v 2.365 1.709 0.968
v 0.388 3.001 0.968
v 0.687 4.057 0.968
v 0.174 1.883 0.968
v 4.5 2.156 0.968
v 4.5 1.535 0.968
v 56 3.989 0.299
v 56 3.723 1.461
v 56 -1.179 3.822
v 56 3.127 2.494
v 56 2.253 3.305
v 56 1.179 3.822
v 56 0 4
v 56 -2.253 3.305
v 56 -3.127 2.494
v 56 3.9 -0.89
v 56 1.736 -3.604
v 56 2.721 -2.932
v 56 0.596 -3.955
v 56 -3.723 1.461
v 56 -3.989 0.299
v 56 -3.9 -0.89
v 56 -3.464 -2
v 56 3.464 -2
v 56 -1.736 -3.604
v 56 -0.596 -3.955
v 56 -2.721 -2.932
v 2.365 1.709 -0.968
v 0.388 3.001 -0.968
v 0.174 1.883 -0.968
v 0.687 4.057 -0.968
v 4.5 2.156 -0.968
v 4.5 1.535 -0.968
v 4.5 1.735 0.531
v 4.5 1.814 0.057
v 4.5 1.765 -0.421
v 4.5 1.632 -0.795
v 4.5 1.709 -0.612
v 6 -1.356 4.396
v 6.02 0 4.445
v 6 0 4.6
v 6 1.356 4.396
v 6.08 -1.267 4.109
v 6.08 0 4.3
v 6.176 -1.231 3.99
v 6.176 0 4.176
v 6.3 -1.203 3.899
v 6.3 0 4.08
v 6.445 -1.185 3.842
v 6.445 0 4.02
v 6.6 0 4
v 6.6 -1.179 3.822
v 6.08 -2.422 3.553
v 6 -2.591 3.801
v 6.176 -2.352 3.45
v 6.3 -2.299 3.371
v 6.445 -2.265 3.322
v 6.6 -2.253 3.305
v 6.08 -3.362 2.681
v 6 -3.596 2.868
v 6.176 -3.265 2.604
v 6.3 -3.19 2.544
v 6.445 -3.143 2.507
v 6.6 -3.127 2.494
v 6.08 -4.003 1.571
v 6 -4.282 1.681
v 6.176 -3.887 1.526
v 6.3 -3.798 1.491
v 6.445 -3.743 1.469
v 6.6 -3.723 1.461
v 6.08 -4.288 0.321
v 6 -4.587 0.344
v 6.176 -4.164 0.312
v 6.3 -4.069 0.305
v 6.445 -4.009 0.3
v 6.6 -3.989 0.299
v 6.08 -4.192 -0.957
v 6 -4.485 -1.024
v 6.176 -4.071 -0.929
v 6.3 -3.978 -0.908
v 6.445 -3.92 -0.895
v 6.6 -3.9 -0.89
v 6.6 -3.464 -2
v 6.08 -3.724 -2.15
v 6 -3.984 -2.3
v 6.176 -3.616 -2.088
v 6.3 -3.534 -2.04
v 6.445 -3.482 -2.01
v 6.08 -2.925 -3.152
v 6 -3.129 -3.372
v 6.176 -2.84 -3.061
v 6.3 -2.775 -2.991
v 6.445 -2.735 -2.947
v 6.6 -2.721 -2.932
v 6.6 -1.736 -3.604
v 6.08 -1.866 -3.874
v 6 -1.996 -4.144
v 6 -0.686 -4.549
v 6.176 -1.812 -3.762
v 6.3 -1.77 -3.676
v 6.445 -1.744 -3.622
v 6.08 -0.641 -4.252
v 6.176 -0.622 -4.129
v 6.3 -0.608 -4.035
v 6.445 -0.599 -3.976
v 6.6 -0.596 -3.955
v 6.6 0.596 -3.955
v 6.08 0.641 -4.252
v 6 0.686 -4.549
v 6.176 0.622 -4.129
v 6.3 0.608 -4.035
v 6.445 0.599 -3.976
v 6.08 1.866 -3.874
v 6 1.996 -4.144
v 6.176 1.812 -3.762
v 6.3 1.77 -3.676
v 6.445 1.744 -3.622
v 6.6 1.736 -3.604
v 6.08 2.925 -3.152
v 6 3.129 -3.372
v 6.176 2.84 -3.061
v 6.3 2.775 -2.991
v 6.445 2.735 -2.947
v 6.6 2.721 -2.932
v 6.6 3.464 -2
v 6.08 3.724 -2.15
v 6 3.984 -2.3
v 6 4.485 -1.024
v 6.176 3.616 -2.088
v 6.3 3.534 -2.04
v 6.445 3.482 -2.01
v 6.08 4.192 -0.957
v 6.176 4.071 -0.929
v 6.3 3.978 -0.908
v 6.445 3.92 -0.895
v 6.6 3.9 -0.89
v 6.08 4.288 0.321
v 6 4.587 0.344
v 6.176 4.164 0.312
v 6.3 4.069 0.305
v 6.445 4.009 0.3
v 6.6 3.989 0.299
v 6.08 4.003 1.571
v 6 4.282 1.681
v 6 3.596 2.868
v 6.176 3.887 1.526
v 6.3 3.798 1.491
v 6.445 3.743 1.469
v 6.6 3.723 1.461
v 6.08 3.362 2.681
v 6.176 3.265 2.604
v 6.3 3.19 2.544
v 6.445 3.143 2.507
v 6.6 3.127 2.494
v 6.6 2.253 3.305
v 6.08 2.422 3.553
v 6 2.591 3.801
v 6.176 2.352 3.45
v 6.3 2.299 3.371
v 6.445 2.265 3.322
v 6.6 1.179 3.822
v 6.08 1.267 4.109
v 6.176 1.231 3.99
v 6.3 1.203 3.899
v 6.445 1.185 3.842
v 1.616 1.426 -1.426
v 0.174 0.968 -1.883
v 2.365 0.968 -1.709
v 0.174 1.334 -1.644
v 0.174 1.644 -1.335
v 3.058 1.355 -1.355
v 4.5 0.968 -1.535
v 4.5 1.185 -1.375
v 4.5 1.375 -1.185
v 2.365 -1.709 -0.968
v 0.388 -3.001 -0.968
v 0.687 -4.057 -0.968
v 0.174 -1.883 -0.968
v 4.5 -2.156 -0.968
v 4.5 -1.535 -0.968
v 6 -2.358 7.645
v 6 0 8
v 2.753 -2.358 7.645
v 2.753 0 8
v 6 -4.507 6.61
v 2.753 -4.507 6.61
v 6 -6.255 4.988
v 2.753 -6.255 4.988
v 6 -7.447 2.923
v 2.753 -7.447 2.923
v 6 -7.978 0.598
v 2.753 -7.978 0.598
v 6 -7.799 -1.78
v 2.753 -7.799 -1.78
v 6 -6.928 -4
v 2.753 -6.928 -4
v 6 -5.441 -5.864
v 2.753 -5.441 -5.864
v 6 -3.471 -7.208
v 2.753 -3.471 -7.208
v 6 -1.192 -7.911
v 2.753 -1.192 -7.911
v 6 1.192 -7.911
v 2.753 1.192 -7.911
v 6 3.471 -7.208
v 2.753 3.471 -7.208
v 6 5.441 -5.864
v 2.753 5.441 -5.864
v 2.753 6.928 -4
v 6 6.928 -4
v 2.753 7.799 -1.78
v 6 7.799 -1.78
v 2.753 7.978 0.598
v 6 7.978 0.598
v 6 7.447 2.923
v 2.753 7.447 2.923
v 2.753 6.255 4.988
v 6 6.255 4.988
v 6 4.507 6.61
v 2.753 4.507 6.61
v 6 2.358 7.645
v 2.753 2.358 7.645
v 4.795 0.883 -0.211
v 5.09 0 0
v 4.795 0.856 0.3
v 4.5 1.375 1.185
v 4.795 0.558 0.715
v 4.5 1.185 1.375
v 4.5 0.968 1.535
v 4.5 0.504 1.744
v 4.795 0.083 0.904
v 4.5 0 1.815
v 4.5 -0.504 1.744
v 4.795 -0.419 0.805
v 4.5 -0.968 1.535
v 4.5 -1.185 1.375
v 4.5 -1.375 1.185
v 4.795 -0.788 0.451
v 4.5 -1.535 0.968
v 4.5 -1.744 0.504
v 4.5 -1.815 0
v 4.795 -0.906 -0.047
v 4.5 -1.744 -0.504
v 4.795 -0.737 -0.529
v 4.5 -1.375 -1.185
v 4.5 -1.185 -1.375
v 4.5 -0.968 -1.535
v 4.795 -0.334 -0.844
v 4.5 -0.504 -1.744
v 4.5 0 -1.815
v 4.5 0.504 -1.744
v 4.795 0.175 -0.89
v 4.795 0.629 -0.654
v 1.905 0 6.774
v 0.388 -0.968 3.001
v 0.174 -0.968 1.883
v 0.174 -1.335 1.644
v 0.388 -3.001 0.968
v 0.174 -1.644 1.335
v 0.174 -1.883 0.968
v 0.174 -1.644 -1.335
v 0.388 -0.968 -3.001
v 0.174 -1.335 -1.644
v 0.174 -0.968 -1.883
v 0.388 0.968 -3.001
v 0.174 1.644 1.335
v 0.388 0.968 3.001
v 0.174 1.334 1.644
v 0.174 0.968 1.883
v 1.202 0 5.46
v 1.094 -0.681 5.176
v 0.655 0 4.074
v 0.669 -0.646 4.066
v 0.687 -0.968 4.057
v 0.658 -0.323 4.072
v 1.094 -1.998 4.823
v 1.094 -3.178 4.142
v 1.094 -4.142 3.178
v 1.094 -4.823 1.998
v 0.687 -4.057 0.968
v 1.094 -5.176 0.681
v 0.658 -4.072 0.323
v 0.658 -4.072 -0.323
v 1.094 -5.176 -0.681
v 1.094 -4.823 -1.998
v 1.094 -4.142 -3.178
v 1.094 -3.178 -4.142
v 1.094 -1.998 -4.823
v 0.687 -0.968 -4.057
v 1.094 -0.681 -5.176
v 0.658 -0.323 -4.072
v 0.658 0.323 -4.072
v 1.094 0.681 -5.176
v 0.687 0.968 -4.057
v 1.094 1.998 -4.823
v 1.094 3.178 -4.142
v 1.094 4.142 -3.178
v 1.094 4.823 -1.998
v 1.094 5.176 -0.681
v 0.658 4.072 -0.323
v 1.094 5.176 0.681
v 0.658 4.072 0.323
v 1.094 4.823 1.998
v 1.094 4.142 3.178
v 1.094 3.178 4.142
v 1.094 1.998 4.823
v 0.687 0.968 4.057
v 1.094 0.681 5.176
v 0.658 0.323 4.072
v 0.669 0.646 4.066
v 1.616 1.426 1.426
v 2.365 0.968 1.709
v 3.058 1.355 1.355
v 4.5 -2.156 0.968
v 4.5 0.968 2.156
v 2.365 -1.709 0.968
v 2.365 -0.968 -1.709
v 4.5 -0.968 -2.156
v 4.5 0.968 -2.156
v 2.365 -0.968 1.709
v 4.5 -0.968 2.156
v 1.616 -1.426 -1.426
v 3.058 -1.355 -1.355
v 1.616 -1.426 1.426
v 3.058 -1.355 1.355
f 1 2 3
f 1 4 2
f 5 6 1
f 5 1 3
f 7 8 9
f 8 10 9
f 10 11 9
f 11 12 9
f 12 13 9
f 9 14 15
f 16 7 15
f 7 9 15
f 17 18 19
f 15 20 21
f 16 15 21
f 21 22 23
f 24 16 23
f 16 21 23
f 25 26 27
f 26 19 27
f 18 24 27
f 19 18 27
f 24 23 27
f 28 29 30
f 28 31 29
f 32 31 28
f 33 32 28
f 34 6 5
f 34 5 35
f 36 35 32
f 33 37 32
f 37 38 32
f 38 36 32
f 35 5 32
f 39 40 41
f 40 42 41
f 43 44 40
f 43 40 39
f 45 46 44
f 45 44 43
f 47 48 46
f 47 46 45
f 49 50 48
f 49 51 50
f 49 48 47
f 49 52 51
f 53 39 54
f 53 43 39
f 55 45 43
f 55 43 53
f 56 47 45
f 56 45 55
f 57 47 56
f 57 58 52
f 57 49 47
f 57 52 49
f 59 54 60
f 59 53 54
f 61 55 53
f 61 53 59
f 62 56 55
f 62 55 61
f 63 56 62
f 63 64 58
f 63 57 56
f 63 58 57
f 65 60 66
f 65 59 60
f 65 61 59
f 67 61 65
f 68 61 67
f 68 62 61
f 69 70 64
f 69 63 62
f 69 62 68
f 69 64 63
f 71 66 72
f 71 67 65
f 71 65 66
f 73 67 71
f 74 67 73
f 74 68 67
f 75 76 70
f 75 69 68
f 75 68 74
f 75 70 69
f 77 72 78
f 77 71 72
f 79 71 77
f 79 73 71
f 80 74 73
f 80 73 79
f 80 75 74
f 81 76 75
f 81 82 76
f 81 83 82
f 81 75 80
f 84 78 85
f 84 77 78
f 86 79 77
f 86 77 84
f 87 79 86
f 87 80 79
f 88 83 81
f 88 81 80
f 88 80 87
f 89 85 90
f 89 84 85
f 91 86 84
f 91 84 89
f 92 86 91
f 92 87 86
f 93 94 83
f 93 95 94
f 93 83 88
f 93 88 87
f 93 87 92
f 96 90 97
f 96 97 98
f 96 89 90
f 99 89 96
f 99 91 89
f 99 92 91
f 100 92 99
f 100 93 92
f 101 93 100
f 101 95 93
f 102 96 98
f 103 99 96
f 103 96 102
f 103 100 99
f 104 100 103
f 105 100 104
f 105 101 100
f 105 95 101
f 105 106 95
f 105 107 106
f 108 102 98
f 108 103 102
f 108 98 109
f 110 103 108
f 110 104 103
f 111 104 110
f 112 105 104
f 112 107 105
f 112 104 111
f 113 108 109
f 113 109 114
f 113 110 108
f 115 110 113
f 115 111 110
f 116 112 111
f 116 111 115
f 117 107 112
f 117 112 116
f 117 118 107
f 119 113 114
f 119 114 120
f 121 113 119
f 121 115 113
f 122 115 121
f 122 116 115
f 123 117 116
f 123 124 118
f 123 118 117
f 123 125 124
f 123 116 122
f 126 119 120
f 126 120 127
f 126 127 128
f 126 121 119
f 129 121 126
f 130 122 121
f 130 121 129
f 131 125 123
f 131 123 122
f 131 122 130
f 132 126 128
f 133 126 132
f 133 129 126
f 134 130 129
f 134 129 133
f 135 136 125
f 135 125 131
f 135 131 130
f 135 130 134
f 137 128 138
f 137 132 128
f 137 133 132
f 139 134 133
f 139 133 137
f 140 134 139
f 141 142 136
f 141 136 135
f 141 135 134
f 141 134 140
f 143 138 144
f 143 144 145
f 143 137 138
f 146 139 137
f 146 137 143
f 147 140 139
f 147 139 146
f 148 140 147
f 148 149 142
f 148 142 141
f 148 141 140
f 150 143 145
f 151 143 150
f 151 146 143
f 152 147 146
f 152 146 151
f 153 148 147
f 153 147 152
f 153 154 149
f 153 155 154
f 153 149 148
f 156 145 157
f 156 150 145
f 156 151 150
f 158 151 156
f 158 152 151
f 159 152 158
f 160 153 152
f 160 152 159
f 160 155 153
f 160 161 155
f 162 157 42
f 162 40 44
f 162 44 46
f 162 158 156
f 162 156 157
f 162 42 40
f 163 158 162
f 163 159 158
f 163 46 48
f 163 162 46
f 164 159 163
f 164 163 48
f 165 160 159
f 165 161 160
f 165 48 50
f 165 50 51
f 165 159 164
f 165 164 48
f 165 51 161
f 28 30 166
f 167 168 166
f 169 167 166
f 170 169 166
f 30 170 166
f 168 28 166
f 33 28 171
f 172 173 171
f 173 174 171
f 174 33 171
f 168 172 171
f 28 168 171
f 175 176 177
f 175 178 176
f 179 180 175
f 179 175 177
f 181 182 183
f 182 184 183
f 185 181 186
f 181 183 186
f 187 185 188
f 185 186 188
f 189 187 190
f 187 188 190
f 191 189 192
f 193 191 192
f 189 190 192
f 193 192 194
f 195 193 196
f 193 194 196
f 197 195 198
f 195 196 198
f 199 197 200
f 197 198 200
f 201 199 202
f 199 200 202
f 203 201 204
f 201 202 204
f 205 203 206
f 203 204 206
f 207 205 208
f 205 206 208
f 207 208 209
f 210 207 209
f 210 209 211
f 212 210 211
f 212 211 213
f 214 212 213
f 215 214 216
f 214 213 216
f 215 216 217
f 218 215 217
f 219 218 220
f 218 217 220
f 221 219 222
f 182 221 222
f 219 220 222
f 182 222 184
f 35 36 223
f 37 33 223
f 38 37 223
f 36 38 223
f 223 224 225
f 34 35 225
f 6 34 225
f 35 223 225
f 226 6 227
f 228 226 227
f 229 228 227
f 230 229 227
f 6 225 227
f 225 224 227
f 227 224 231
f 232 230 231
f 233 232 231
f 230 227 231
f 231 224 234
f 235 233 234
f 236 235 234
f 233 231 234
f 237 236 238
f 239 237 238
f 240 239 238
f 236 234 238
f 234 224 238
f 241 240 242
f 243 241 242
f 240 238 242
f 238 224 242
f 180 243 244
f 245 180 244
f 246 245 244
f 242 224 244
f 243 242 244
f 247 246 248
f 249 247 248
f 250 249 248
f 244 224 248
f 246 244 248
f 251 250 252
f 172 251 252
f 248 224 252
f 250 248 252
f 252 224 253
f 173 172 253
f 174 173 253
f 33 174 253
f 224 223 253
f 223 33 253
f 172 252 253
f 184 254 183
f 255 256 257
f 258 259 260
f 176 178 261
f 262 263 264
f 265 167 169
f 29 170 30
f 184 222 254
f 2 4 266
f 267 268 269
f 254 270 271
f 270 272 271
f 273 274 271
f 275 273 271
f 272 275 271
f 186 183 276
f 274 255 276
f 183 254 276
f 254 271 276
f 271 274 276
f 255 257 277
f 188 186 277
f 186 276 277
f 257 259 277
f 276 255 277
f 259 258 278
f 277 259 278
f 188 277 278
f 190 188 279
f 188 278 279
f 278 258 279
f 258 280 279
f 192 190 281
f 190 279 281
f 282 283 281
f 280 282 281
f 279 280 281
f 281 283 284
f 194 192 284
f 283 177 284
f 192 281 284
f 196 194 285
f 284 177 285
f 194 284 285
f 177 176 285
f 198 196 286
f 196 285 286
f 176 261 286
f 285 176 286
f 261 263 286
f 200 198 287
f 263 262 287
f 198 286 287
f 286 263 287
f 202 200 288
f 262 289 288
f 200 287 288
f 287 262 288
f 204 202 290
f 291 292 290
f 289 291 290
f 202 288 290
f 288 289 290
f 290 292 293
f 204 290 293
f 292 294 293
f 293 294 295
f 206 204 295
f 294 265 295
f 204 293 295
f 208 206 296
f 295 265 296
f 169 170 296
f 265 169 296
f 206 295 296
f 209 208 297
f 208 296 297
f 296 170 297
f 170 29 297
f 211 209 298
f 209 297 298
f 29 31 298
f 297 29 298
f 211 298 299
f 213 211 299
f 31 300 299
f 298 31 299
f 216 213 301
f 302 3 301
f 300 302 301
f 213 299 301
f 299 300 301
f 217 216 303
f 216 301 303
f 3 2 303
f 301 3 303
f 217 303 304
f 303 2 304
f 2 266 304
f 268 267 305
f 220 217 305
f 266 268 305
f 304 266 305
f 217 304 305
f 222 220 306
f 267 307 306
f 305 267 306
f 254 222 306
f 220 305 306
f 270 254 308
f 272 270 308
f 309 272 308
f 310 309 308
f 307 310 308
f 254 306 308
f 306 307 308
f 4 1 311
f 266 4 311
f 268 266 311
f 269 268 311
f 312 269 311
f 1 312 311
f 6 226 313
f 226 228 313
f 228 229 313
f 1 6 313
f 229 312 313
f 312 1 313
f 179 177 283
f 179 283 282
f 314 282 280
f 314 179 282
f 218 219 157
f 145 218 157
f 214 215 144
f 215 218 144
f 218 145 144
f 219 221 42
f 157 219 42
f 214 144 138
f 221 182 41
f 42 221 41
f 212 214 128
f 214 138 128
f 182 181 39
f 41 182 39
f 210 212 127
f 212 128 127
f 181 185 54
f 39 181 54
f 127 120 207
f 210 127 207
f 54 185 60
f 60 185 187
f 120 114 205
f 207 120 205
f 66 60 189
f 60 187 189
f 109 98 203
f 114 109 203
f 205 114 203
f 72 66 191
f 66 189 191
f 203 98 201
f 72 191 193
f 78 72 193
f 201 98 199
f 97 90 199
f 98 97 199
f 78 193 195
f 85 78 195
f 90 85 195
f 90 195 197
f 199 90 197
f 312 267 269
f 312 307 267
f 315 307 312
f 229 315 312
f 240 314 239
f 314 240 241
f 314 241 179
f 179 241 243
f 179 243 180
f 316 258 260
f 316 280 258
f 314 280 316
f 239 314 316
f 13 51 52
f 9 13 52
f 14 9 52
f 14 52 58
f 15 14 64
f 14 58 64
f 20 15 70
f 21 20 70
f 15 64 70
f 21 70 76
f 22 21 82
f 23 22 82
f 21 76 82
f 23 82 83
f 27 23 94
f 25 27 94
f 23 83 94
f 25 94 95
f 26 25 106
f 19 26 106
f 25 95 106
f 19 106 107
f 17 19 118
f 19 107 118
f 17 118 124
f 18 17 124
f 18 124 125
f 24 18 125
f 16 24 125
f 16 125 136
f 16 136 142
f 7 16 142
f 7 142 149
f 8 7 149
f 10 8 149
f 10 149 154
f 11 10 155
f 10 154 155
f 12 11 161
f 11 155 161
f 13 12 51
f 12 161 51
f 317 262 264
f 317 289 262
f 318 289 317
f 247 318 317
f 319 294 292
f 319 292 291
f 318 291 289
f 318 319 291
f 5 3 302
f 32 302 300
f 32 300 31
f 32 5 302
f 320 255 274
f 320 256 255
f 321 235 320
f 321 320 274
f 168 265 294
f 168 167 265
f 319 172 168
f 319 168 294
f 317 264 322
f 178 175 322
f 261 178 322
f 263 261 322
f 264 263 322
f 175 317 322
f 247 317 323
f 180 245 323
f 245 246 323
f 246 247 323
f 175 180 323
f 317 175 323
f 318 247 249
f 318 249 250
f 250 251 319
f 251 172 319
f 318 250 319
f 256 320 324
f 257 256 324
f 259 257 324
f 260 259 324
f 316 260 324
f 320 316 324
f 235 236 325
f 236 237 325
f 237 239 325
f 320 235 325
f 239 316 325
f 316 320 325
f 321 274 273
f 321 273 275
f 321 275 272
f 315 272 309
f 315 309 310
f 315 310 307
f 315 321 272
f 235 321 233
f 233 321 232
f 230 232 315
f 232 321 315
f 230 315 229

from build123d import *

# Parameters (mm, degrees)
FILLET1_R    = 0.6
RECPAT_COUNT = 2
RECPAT_ANGLE = 90


with BuildPart() as part:
    # BodySke → BaseBody (revolve)
    with BuildSketch(Plane.XY, mode=Mode.PRIVATE) as basebody_sk:
        with BuildLine():
            Line((6, 4), (6, 8))
            Line((6, 8), (2.753049234, 8))
            ThreePointArc((2.753049234, 8), (0.707515305, 4.230226947), (0, 0))
            Line((0, 0), (56, 0))
            Line((56, 0), (56, 4))
            Line((56, 4), (6, 4))
        make_face()
    revolve(basebody_sk.sketch.rotate(Axis((0, 0, 0), (1, 0, 0)), 90), axis=Axis((0, 0, 0), (1, 0, 0)))

    # Fillet1
    fillet1_edges = [part.edges().sort_by_distance(p)[0] for p in [
        (6, 0, -4),
    ]]
    fillet(fillet1_edges, radius=FILLET1_R)

    # RecSkeTop → Recess section 0
    with BuildSketch(Plane(origin=(0, 0, 0), x_dir=(0, 0, -1), z_dir=(1, 0, 0))):
        with BuildLine():
            Line((-0.968, 4.4), (0.968, 4.4))
            Line((0.968, 4.4), (0.968, -4.4))
            Line((0.968, -4.4), (-0.968, -4.4))
            Line((-0.968, -4.4), (-0.968, 4.4))
        make_face()
    # RecSkeBot → Recess section 1
    with BuildSketch(Plane(origin=(4.5, 0, 0), x_dir=(0, 0, -1), z_dir=(1, 0, 0))):
        with BuildLine():
            Line((-0.968, 2.156383139), (0.968, 2.156383139))
            Line((0.968, 2.156383139), (0.968, -2.156383139))
            Line((0.968, -2.156383139), (-0.968, -2.156383139))
            Line((-0.968, -2.156383139), (-0.968, 2.156383139))
        make_face()
    recess = loft(mode=Mode.SUBTRACT)

    # RecPat: Recess ×2 about axis
    recpat_axis = Axis((0, 0, 0), (1, 0, 0))
    for i in range(1, RECPAT_COUNT):
        add(recess.rotate(recpat_axis, i * RECPAT_ANGLE / (RECPAT_COUNT - 1)), mode=Mode.SUBTRACT)

    # RecCorSke → RecessCore (revolve, cut)
    with BuildSketch(Plane.XY, mode=Mode.PRIVATE) as recesscore_sk:
        Polygon((0, 0), (0, 2.1296), (4.5, 1.814929346), (5.089706292, 0), align=None)
    revolve(recesscore_sk.sketch.rotate(Axis((0, 0, 0), (1, 0, 0)), 346.581092025), axis=Axis((0, 0, 0), (1, 0, 0)), mode=Mode.SUBTRACT)


solid = part.part
